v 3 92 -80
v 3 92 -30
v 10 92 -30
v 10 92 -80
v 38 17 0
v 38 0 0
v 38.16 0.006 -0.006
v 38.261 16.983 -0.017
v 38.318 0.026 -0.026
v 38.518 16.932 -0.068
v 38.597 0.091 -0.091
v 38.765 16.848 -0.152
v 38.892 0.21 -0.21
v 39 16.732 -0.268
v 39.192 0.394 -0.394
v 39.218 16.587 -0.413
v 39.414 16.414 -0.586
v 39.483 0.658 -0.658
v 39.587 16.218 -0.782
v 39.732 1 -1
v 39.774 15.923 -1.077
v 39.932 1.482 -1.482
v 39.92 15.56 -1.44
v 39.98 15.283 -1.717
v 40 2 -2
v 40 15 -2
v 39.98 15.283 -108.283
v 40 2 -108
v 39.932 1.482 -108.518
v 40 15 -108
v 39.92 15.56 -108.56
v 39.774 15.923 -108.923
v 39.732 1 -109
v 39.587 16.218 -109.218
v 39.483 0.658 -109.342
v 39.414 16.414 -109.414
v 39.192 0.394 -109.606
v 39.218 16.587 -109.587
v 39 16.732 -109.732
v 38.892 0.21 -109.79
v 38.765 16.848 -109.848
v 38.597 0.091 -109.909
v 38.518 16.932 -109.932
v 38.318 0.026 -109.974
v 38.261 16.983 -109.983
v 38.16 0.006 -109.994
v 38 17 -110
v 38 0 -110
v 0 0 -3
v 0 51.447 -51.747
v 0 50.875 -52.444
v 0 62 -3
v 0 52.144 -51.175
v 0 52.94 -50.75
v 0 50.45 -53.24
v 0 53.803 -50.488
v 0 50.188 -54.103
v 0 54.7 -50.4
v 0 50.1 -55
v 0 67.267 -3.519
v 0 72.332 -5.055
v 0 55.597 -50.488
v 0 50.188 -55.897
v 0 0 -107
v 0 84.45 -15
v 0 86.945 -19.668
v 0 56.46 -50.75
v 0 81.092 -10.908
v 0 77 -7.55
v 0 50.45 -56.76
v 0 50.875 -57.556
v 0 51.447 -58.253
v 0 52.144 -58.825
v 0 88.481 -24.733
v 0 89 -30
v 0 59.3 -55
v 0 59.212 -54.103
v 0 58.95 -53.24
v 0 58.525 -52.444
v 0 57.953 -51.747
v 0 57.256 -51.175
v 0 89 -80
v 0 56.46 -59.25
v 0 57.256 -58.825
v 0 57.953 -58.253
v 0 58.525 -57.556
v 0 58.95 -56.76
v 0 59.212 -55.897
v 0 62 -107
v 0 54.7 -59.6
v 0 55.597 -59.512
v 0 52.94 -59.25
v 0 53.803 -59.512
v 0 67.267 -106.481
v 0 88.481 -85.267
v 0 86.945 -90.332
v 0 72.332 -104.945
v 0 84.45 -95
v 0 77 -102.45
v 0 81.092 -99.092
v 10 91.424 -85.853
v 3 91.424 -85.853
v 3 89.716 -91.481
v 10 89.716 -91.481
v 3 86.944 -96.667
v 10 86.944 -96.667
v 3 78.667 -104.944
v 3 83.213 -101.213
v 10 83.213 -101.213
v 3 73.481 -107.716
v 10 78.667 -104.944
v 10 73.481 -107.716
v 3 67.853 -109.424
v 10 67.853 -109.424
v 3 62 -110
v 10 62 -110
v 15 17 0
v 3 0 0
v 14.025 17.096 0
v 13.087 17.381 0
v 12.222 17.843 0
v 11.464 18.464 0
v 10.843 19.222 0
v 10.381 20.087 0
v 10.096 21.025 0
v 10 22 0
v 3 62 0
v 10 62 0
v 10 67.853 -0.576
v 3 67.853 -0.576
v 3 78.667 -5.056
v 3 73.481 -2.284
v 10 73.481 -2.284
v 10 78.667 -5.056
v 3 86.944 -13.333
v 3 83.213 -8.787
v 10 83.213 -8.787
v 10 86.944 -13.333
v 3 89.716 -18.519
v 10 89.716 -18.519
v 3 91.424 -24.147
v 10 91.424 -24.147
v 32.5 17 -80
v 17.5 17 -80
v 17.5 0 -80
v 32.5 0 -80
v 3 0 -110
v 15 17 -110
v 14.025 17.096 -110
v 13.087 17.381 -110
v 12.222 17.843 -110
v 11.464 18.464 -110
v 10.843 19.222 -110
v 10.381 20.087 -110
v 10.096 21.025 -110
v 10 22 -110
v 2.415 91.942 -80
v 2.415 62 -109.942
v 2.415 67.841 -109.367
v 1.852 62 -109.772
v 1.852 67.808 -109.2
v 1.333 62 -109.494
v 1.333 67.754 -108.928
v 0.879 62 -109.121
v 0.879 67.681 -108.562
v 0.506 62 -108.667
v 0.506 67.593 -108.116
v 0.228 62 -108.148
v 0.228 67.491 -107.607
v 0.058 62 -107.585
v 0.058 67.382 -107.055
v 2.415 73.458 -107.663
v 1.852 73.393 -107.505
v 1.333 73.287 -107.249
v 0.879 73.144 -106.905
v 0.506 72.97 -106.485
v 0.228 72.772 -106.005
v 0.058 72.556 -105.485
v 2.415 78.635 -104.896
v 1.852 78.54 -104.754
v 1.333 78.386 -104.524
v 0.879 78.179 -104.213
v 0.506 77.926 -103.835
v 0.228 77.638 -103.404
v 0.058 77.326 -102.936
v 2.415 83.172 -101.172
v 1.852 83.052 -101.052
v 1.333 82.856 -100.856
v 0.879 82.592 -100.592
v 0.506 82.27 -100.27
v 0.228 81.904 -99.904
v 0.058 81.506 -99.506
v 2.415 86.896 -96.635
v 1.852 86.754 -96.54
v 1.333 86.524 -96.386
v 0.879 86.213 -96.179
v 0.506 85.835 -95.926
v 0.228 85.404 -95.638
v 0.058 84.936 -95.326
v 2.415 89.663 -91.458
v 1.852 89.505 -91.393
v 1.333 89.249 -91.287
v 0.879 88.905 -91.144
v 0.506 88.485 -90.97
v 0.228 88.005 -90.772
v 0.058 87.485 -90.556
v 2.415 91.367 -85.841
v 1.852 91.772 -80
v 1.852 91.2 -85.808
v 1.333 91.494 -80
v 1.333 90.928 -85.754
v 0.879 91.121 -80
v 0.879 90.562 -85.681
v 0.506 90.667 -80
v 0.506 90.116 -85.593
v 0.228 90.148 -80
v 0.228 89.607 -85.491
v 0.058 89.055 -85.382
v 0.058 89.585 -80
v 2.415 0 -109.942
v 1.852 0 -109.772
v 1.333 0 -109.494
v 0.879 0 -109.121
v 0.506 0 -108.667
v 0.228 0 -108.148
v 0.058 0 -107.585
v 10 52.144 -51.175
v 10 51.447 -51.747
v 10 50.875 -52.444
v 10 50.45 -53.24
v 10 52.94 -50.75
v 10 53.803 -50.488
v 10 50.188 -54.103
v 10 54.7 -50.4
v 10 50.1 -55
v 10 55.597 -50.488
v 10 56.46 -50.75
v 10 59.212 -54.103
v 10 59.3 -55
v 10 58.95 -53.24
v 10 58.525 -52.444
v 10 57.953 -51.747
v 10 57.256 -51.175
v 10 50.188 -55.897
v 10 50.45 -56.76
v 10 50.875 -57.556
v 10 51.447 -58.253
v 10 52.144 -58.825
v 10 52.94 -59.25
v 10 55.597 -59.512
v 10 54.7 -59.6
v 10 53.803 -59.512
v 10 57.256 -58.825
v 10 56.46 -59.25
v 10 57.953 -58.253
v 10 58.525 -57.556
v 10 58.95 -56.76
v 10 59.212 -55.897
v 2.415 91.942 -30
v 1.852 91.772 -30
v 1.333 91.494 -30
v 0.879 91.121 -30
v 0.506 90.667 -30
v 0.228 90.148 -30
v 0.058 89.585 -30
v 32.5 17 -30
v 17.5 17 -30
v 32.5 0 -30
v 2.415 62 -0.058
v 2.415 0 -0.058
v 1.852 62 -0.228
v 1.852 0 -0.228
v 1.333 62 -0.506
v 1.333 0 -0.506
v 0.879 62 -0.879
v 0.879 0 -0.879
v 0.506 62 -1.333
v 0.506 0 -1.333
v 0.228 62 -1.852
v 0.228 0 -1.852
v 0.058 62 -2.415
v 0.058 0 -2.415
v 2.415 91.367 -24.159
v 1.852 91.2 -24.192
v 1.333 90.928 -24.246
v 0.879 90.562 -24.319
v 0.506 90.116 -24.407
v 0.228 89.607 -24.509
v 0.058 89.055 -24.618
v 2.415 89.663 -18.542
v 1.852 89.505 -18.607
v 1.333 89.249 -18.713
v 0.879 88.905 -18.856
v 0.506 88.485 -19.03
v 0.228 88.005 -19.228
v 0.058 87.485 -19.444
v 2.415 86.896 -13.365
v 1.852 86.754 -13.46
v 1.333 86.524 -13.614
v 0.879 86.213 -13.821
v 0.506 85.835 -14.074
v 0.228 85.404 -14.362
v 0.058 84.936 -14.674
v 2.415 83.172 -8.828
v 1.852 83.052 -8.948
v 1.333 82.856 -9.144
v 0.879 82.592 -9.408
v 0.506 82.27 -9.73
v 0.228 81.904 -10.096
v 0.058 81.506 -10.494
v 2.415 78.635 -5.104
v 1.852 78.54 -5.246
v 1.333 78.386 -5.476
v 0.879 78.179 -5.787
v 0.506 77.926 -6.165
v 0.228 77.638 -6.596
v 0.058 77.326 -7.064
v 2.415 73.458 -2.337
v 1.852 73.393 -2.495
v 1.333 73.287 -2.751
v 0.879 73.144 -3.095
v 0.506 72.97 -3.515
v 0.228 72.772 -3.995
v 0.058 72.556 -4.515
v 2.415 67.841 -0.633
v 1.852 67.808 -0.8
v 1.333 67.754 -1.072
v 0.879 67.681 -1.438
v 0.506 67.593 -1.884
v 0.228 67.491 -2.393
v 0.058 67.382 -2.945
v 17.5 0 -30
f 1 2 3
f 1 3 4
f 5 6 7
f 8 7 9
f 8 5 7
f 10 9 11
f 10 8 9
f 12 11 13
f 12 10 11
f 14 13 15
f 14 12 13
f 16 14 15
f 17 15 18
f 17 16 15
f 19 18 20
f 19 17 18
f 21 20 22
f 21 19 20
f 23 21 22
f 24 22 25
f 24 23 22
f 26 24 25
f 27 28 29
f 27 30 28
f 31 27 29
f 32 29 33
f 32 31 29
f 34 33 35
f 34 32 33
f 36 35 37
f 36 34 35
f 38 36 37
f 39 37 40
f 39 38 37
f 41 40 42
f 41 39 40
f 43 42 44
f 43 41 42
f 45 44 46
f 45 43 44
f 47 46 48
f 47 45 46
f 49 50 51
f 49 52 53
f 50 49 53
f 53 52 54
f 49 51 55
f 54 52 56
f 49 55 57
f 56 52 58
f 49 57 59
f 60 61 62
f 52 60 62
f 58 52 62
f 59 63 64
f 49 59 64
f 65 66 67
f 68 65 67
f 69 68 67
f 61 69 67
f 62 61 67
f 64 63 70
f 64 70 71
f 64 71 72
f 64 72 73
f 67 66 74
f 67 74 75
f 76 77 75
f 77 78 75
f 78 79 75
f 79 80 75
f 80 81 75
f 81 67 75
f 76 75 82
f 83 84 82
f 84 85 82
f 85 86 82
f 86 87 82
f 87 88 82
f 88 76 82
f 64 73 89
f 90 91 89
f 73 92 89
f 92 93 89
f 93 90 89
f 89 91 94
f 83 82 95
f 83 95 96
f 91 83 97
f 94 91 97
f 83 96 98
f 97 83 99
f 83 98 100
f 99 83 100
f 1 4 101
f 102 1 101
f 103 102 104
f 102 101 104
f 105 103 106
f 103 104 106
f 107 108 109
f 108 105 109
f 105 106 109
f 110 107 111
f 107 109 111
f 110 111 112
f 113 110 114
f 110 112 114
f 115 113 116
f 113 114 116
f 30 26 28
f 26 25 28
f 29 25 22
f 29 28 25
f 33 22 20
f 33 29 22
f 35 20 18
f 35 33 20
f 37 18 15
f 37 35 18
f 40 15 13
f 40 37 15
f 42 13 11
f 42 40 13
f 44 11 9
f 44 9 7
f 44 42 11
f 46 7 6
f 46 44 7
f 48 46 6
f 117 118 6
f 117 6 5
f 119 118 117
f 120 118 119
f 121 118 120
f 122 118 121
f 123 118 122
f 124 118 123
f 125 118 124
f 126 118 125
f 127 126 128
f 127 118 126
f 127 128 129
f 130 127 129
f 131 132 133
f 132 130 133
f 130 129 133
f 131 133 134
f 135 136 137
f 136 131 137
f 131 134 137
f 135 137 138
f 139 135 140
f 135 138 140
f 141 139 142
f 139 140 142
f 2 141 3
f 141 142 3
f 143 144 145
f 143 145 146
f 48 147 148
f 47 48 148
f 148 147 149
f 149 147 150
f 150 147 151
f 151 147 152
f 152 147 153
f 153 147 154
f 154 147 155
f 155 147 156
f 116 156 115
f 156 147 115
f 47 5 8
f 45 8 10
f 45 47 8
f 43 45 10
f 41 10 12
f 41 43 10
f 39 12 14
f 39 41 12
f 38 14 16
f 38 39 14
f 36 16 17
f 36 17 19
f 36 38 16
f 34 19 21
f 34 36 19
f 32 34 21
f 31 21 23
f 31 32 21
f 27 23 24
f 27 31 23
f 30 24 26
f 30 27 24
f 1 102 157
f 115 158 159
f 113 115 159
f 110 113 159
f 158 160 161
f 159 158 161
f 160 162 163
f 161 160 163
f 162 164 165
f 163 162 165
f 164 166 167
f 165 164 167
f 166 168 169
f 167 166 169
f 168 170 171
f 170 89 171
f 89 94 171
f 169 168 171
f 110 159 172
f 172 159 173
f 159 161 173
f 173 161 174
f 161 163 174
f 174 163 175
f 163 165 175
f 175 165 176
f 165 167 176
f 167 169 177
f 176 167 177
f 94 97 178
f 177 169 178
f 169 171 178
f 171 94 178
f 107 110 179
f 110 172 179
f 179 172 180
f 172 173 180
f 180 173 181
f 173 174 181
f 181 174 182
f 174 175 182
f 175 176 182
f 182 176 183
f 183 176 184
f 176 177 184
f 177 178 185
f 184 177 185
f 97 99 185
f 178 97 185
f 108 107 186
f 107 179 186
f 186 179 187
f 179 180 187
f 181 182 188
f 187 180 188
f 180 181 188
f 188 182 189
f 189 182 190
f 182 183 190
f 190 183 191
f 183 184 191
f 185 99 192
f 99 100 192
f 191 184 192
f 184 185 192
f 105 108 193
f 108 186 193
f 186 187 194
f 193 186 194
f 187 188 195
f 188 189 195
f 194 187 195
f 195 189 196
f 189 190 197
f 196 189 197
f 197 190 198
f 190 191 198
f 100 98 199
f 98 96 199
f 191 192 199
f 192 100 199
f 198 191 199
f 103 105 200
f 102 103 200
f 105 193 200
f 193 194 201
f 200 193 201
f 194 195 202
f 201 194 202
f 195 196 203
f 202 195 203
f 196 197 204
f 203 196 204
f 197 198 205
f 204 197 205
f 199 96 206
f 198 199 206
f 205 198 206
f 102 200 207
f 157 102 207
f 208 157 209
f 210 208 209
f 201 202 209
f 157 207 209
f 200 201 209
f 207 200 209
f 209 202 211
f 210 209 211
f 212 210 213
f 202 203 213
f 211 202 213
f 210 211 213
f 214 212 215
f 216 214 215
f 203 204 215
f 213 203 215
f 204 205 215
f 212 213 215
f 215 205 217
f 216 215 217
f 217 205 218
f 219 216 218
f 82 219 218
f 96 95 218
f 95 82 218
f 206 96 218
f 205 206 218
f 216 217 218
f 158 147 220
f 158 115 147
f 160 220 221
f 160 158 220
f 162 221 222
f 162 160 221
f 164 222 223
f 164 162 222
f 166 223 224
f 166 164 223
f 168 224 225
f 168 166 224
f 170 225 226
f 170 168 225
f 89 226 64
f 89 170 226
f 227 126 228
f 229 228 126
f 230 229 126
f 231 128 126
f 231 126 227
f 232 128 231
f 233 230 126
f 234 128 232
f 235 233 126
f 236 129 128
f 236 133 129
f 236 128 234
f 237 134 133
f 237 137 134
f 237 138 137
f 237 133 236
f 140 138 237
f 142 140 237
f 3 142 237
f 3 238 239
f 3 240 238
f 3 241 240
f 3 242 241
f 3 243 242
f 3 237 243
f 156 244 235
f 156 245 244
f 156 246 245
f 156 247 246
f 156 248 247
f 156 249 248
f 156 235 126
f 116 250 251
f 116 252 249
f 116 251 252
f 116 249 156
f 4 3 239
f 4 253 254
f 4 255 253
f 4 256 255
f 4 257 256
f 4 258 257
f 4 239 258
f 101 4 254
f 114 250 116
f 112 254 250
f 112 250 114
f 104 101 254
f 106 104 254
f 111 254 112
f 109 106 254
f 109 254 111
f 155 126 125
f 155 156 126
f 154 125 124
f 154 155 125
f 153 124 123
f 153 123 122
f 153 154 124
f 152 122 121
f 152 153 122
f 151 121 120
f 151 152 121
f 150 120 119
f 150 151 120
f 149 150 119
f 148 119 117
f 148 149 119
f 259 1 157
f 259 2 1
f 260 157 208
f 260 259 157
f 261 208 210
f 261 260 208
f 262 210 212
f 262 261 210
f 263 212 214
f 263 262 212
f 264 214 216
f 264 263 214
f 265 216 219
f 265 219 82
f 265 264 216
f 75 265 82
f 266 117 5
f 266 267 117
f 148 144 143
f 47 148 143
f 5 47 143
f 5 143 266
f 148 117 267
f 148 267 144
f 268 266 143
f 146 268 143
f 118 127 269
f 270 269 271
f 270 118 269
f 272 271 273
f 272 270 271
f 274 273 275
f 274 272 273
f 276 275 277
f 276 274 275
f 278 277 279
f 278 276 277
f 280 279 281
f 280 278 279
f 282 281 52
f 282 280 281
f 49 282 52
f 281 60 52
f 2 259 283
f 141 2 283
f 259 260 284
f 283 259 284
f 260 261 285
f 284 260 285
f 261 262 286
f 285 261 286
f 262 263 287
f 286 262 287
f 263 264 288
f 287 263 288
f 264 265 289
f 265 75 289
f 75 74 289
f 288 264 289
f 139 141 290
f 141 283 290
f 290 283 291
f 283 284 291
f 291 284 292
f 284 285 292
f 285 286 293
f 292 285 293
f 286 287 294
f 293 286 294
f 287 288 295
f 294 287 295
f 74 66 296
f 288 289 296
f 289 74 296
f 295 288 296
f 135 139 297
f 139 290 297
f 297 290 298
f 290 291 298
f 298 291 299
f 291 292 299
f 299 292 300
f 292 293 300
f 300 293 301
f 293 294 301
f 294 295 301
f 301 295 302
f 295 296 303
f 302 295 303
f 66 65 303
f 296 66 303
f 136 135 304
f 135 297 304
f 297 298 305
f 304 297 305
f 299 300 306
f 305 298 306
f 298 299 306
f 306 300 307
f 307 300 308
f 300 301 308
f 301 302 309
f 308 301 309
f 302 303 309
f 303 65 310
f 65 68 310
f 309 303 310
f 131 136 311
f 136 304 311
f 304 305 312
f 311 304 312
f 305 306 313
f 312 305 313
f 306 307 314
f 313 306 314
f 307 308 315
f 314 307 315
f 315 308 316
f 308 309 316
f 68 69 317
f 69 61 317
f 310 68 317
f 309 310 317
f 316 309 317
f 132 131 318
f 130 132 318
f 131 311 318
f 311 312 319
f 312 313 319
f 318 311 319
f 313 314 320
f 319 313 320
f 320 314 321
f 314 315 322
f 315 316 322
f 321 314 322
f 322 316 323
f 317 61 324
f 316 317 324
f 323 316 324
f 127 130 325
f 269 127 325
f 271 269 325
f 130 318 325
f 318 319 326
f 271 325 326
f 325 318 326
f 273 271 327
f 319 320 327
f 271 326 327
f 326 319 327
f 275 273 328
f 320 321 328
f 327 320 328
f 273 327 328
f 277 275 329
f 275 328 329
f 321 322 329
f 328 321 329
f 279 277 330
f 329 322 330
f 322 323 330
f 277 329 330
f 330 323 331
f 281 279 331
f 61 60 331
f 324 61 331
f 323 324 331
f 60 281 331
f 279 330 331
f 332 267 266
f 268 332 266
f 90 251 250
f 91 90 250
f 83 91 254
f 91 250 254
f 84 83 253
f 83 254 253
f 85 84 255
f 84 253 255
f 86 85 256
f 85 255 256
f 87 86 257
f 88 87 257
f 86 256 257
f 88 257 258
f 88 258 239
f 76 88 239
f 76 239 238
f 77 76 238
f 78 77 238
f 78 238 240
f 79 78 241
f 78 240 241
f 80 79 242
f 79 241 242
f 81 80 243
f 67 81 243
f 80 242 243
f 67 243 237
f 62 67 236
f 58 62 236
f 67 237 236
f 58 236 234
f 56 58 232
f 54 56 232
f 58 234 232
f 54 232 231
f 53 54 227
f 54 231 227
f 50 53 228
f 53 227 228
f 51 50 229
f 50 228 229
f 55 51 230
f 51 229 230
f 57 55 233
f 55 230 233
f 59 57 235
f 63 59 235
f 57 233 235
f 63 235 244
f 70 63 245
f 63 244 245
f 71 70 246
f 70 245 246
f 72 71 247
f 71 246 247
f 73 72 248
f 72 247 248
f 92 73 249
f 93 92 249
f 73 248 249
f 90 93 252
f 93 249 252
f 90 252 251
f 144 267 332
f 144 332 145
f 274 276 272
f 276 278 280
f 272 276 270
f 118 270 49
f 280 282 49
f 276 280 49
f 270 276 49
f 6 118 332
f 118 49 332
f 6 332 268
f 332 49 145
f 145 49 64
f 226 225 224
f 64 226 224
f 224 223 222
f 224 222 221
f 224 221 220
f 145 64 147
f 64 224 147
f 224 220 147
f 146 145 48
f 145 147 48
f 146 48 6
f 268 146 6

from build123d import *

# Parameters (mm, degrees)
SKETCH1_W           = 40
SKETCH1_H           = 110
BOSS_EXTRUDE1_DEPTH = 17
SKETCH4_W           = 110
SKETCH4_H           = 75
BOSS_EXTRUDE2_DEPTH = 10
SKETCH5_W           = 15
SKETCH5_H           = 50
CUT_EXTRUDE1_DEPTH  = 17
SKETCH6_R           = 4.6
CUT_EXTRUDE2_DEPTH  = 10
FILLET1_R           = 30
FILLET2_R           = 3
FILLET3_R           = 5
FILLET4_R           = 2


with BuildPart() as part:
    # Sketch1 → Boss-Extrude1 (new body)
    with BuildSketch(Plane(origin=(0, 0, 0), x_dir=(1, 0, 0), z_dir=(0, 1, 0))):
        with Locations((20, 55)):
            Rectangle(SKETCH1_W, SKETCH1_H)
    extrude(amount=BOSS_EXTRUDE1_DEPTH)

    # Sketch4 → Boss-Extrude2 (add)
    with BuildSketch(Plane(origin=(0, 0, 0), x_dir=(0, 0, -1), z_dir=(1, 0, 0))):
        with Locations((55, 54.5)):
            Rectangle(SKETCH4_W, SKETCH4_H)
    extrude(amount=BOSS_EXTRUDE2_DEPTH)

    # Sketch5 → Cut-Extrude1 (cut)
    with BuildSketch(Plane(origin=(0, 17, 0), x_dir=(1, 0, 0), z_dir=(0, 1, 0))):
        with Locations((25, 55)):
            Rectangle(SKETCH5_W, SKETCH5_H)
    extrude(amount=-CUT_EXTRUDE1_DEPTH, mode=Mode.SUBTRACT)

    # Sketch6 → Cut-Extrude2 (cut)
    with BuildSketch(Plane(origin=(10, 0, 0), x_dir=(0, 0, -1), z_dir=(1, 0, 0))):
        with Locations((55, 54.7)):
            Circle(SKETCH6_R)
    extrude(amount=-CUT_EXTRUDE2_DEPTH, mode=Mode.SUBTRACT)

    # Fillet1
    fillet1_edges = [part.edges().sort_by_distance(p)[0] for p in [
        (5, 92, 0),
        (5, 92, -110),
    ]]
    fillet(fillet1_edges, radius=FILLET1_R)

    # Fillet2
    fillet2_edges = [part.edges().sort_by_distance(p)[0] for p in [
        (0, 31, 0),
        (0, 92, -55),
        (0, 31, -110),
        (0, 83.213203436, -101.213203436),
        (0, 83.213203436, -8.786796564),
    ]]
    fillet(fillet2_edges, radius=FILLET2_R)

    # Fillet3
    fillet3_edges = [part.edges().sort_by_distance(p)[0] for p in [
        (10, 17, -55),
    ]]
    fillet(fillet3_edges, radius=FILLET3_R)

    # Fillet4
    fillet4_edges = [part.edges().sort_by_distance(p)[0] for p in [
        (40, 17, -55),
        (40, 0, -55),
        (40, 8.5, -110),
        (40, 8.5, 0),
    ]]
    fillet(fillet4_edges, radius=FILLET4_R)


solid = part.part
